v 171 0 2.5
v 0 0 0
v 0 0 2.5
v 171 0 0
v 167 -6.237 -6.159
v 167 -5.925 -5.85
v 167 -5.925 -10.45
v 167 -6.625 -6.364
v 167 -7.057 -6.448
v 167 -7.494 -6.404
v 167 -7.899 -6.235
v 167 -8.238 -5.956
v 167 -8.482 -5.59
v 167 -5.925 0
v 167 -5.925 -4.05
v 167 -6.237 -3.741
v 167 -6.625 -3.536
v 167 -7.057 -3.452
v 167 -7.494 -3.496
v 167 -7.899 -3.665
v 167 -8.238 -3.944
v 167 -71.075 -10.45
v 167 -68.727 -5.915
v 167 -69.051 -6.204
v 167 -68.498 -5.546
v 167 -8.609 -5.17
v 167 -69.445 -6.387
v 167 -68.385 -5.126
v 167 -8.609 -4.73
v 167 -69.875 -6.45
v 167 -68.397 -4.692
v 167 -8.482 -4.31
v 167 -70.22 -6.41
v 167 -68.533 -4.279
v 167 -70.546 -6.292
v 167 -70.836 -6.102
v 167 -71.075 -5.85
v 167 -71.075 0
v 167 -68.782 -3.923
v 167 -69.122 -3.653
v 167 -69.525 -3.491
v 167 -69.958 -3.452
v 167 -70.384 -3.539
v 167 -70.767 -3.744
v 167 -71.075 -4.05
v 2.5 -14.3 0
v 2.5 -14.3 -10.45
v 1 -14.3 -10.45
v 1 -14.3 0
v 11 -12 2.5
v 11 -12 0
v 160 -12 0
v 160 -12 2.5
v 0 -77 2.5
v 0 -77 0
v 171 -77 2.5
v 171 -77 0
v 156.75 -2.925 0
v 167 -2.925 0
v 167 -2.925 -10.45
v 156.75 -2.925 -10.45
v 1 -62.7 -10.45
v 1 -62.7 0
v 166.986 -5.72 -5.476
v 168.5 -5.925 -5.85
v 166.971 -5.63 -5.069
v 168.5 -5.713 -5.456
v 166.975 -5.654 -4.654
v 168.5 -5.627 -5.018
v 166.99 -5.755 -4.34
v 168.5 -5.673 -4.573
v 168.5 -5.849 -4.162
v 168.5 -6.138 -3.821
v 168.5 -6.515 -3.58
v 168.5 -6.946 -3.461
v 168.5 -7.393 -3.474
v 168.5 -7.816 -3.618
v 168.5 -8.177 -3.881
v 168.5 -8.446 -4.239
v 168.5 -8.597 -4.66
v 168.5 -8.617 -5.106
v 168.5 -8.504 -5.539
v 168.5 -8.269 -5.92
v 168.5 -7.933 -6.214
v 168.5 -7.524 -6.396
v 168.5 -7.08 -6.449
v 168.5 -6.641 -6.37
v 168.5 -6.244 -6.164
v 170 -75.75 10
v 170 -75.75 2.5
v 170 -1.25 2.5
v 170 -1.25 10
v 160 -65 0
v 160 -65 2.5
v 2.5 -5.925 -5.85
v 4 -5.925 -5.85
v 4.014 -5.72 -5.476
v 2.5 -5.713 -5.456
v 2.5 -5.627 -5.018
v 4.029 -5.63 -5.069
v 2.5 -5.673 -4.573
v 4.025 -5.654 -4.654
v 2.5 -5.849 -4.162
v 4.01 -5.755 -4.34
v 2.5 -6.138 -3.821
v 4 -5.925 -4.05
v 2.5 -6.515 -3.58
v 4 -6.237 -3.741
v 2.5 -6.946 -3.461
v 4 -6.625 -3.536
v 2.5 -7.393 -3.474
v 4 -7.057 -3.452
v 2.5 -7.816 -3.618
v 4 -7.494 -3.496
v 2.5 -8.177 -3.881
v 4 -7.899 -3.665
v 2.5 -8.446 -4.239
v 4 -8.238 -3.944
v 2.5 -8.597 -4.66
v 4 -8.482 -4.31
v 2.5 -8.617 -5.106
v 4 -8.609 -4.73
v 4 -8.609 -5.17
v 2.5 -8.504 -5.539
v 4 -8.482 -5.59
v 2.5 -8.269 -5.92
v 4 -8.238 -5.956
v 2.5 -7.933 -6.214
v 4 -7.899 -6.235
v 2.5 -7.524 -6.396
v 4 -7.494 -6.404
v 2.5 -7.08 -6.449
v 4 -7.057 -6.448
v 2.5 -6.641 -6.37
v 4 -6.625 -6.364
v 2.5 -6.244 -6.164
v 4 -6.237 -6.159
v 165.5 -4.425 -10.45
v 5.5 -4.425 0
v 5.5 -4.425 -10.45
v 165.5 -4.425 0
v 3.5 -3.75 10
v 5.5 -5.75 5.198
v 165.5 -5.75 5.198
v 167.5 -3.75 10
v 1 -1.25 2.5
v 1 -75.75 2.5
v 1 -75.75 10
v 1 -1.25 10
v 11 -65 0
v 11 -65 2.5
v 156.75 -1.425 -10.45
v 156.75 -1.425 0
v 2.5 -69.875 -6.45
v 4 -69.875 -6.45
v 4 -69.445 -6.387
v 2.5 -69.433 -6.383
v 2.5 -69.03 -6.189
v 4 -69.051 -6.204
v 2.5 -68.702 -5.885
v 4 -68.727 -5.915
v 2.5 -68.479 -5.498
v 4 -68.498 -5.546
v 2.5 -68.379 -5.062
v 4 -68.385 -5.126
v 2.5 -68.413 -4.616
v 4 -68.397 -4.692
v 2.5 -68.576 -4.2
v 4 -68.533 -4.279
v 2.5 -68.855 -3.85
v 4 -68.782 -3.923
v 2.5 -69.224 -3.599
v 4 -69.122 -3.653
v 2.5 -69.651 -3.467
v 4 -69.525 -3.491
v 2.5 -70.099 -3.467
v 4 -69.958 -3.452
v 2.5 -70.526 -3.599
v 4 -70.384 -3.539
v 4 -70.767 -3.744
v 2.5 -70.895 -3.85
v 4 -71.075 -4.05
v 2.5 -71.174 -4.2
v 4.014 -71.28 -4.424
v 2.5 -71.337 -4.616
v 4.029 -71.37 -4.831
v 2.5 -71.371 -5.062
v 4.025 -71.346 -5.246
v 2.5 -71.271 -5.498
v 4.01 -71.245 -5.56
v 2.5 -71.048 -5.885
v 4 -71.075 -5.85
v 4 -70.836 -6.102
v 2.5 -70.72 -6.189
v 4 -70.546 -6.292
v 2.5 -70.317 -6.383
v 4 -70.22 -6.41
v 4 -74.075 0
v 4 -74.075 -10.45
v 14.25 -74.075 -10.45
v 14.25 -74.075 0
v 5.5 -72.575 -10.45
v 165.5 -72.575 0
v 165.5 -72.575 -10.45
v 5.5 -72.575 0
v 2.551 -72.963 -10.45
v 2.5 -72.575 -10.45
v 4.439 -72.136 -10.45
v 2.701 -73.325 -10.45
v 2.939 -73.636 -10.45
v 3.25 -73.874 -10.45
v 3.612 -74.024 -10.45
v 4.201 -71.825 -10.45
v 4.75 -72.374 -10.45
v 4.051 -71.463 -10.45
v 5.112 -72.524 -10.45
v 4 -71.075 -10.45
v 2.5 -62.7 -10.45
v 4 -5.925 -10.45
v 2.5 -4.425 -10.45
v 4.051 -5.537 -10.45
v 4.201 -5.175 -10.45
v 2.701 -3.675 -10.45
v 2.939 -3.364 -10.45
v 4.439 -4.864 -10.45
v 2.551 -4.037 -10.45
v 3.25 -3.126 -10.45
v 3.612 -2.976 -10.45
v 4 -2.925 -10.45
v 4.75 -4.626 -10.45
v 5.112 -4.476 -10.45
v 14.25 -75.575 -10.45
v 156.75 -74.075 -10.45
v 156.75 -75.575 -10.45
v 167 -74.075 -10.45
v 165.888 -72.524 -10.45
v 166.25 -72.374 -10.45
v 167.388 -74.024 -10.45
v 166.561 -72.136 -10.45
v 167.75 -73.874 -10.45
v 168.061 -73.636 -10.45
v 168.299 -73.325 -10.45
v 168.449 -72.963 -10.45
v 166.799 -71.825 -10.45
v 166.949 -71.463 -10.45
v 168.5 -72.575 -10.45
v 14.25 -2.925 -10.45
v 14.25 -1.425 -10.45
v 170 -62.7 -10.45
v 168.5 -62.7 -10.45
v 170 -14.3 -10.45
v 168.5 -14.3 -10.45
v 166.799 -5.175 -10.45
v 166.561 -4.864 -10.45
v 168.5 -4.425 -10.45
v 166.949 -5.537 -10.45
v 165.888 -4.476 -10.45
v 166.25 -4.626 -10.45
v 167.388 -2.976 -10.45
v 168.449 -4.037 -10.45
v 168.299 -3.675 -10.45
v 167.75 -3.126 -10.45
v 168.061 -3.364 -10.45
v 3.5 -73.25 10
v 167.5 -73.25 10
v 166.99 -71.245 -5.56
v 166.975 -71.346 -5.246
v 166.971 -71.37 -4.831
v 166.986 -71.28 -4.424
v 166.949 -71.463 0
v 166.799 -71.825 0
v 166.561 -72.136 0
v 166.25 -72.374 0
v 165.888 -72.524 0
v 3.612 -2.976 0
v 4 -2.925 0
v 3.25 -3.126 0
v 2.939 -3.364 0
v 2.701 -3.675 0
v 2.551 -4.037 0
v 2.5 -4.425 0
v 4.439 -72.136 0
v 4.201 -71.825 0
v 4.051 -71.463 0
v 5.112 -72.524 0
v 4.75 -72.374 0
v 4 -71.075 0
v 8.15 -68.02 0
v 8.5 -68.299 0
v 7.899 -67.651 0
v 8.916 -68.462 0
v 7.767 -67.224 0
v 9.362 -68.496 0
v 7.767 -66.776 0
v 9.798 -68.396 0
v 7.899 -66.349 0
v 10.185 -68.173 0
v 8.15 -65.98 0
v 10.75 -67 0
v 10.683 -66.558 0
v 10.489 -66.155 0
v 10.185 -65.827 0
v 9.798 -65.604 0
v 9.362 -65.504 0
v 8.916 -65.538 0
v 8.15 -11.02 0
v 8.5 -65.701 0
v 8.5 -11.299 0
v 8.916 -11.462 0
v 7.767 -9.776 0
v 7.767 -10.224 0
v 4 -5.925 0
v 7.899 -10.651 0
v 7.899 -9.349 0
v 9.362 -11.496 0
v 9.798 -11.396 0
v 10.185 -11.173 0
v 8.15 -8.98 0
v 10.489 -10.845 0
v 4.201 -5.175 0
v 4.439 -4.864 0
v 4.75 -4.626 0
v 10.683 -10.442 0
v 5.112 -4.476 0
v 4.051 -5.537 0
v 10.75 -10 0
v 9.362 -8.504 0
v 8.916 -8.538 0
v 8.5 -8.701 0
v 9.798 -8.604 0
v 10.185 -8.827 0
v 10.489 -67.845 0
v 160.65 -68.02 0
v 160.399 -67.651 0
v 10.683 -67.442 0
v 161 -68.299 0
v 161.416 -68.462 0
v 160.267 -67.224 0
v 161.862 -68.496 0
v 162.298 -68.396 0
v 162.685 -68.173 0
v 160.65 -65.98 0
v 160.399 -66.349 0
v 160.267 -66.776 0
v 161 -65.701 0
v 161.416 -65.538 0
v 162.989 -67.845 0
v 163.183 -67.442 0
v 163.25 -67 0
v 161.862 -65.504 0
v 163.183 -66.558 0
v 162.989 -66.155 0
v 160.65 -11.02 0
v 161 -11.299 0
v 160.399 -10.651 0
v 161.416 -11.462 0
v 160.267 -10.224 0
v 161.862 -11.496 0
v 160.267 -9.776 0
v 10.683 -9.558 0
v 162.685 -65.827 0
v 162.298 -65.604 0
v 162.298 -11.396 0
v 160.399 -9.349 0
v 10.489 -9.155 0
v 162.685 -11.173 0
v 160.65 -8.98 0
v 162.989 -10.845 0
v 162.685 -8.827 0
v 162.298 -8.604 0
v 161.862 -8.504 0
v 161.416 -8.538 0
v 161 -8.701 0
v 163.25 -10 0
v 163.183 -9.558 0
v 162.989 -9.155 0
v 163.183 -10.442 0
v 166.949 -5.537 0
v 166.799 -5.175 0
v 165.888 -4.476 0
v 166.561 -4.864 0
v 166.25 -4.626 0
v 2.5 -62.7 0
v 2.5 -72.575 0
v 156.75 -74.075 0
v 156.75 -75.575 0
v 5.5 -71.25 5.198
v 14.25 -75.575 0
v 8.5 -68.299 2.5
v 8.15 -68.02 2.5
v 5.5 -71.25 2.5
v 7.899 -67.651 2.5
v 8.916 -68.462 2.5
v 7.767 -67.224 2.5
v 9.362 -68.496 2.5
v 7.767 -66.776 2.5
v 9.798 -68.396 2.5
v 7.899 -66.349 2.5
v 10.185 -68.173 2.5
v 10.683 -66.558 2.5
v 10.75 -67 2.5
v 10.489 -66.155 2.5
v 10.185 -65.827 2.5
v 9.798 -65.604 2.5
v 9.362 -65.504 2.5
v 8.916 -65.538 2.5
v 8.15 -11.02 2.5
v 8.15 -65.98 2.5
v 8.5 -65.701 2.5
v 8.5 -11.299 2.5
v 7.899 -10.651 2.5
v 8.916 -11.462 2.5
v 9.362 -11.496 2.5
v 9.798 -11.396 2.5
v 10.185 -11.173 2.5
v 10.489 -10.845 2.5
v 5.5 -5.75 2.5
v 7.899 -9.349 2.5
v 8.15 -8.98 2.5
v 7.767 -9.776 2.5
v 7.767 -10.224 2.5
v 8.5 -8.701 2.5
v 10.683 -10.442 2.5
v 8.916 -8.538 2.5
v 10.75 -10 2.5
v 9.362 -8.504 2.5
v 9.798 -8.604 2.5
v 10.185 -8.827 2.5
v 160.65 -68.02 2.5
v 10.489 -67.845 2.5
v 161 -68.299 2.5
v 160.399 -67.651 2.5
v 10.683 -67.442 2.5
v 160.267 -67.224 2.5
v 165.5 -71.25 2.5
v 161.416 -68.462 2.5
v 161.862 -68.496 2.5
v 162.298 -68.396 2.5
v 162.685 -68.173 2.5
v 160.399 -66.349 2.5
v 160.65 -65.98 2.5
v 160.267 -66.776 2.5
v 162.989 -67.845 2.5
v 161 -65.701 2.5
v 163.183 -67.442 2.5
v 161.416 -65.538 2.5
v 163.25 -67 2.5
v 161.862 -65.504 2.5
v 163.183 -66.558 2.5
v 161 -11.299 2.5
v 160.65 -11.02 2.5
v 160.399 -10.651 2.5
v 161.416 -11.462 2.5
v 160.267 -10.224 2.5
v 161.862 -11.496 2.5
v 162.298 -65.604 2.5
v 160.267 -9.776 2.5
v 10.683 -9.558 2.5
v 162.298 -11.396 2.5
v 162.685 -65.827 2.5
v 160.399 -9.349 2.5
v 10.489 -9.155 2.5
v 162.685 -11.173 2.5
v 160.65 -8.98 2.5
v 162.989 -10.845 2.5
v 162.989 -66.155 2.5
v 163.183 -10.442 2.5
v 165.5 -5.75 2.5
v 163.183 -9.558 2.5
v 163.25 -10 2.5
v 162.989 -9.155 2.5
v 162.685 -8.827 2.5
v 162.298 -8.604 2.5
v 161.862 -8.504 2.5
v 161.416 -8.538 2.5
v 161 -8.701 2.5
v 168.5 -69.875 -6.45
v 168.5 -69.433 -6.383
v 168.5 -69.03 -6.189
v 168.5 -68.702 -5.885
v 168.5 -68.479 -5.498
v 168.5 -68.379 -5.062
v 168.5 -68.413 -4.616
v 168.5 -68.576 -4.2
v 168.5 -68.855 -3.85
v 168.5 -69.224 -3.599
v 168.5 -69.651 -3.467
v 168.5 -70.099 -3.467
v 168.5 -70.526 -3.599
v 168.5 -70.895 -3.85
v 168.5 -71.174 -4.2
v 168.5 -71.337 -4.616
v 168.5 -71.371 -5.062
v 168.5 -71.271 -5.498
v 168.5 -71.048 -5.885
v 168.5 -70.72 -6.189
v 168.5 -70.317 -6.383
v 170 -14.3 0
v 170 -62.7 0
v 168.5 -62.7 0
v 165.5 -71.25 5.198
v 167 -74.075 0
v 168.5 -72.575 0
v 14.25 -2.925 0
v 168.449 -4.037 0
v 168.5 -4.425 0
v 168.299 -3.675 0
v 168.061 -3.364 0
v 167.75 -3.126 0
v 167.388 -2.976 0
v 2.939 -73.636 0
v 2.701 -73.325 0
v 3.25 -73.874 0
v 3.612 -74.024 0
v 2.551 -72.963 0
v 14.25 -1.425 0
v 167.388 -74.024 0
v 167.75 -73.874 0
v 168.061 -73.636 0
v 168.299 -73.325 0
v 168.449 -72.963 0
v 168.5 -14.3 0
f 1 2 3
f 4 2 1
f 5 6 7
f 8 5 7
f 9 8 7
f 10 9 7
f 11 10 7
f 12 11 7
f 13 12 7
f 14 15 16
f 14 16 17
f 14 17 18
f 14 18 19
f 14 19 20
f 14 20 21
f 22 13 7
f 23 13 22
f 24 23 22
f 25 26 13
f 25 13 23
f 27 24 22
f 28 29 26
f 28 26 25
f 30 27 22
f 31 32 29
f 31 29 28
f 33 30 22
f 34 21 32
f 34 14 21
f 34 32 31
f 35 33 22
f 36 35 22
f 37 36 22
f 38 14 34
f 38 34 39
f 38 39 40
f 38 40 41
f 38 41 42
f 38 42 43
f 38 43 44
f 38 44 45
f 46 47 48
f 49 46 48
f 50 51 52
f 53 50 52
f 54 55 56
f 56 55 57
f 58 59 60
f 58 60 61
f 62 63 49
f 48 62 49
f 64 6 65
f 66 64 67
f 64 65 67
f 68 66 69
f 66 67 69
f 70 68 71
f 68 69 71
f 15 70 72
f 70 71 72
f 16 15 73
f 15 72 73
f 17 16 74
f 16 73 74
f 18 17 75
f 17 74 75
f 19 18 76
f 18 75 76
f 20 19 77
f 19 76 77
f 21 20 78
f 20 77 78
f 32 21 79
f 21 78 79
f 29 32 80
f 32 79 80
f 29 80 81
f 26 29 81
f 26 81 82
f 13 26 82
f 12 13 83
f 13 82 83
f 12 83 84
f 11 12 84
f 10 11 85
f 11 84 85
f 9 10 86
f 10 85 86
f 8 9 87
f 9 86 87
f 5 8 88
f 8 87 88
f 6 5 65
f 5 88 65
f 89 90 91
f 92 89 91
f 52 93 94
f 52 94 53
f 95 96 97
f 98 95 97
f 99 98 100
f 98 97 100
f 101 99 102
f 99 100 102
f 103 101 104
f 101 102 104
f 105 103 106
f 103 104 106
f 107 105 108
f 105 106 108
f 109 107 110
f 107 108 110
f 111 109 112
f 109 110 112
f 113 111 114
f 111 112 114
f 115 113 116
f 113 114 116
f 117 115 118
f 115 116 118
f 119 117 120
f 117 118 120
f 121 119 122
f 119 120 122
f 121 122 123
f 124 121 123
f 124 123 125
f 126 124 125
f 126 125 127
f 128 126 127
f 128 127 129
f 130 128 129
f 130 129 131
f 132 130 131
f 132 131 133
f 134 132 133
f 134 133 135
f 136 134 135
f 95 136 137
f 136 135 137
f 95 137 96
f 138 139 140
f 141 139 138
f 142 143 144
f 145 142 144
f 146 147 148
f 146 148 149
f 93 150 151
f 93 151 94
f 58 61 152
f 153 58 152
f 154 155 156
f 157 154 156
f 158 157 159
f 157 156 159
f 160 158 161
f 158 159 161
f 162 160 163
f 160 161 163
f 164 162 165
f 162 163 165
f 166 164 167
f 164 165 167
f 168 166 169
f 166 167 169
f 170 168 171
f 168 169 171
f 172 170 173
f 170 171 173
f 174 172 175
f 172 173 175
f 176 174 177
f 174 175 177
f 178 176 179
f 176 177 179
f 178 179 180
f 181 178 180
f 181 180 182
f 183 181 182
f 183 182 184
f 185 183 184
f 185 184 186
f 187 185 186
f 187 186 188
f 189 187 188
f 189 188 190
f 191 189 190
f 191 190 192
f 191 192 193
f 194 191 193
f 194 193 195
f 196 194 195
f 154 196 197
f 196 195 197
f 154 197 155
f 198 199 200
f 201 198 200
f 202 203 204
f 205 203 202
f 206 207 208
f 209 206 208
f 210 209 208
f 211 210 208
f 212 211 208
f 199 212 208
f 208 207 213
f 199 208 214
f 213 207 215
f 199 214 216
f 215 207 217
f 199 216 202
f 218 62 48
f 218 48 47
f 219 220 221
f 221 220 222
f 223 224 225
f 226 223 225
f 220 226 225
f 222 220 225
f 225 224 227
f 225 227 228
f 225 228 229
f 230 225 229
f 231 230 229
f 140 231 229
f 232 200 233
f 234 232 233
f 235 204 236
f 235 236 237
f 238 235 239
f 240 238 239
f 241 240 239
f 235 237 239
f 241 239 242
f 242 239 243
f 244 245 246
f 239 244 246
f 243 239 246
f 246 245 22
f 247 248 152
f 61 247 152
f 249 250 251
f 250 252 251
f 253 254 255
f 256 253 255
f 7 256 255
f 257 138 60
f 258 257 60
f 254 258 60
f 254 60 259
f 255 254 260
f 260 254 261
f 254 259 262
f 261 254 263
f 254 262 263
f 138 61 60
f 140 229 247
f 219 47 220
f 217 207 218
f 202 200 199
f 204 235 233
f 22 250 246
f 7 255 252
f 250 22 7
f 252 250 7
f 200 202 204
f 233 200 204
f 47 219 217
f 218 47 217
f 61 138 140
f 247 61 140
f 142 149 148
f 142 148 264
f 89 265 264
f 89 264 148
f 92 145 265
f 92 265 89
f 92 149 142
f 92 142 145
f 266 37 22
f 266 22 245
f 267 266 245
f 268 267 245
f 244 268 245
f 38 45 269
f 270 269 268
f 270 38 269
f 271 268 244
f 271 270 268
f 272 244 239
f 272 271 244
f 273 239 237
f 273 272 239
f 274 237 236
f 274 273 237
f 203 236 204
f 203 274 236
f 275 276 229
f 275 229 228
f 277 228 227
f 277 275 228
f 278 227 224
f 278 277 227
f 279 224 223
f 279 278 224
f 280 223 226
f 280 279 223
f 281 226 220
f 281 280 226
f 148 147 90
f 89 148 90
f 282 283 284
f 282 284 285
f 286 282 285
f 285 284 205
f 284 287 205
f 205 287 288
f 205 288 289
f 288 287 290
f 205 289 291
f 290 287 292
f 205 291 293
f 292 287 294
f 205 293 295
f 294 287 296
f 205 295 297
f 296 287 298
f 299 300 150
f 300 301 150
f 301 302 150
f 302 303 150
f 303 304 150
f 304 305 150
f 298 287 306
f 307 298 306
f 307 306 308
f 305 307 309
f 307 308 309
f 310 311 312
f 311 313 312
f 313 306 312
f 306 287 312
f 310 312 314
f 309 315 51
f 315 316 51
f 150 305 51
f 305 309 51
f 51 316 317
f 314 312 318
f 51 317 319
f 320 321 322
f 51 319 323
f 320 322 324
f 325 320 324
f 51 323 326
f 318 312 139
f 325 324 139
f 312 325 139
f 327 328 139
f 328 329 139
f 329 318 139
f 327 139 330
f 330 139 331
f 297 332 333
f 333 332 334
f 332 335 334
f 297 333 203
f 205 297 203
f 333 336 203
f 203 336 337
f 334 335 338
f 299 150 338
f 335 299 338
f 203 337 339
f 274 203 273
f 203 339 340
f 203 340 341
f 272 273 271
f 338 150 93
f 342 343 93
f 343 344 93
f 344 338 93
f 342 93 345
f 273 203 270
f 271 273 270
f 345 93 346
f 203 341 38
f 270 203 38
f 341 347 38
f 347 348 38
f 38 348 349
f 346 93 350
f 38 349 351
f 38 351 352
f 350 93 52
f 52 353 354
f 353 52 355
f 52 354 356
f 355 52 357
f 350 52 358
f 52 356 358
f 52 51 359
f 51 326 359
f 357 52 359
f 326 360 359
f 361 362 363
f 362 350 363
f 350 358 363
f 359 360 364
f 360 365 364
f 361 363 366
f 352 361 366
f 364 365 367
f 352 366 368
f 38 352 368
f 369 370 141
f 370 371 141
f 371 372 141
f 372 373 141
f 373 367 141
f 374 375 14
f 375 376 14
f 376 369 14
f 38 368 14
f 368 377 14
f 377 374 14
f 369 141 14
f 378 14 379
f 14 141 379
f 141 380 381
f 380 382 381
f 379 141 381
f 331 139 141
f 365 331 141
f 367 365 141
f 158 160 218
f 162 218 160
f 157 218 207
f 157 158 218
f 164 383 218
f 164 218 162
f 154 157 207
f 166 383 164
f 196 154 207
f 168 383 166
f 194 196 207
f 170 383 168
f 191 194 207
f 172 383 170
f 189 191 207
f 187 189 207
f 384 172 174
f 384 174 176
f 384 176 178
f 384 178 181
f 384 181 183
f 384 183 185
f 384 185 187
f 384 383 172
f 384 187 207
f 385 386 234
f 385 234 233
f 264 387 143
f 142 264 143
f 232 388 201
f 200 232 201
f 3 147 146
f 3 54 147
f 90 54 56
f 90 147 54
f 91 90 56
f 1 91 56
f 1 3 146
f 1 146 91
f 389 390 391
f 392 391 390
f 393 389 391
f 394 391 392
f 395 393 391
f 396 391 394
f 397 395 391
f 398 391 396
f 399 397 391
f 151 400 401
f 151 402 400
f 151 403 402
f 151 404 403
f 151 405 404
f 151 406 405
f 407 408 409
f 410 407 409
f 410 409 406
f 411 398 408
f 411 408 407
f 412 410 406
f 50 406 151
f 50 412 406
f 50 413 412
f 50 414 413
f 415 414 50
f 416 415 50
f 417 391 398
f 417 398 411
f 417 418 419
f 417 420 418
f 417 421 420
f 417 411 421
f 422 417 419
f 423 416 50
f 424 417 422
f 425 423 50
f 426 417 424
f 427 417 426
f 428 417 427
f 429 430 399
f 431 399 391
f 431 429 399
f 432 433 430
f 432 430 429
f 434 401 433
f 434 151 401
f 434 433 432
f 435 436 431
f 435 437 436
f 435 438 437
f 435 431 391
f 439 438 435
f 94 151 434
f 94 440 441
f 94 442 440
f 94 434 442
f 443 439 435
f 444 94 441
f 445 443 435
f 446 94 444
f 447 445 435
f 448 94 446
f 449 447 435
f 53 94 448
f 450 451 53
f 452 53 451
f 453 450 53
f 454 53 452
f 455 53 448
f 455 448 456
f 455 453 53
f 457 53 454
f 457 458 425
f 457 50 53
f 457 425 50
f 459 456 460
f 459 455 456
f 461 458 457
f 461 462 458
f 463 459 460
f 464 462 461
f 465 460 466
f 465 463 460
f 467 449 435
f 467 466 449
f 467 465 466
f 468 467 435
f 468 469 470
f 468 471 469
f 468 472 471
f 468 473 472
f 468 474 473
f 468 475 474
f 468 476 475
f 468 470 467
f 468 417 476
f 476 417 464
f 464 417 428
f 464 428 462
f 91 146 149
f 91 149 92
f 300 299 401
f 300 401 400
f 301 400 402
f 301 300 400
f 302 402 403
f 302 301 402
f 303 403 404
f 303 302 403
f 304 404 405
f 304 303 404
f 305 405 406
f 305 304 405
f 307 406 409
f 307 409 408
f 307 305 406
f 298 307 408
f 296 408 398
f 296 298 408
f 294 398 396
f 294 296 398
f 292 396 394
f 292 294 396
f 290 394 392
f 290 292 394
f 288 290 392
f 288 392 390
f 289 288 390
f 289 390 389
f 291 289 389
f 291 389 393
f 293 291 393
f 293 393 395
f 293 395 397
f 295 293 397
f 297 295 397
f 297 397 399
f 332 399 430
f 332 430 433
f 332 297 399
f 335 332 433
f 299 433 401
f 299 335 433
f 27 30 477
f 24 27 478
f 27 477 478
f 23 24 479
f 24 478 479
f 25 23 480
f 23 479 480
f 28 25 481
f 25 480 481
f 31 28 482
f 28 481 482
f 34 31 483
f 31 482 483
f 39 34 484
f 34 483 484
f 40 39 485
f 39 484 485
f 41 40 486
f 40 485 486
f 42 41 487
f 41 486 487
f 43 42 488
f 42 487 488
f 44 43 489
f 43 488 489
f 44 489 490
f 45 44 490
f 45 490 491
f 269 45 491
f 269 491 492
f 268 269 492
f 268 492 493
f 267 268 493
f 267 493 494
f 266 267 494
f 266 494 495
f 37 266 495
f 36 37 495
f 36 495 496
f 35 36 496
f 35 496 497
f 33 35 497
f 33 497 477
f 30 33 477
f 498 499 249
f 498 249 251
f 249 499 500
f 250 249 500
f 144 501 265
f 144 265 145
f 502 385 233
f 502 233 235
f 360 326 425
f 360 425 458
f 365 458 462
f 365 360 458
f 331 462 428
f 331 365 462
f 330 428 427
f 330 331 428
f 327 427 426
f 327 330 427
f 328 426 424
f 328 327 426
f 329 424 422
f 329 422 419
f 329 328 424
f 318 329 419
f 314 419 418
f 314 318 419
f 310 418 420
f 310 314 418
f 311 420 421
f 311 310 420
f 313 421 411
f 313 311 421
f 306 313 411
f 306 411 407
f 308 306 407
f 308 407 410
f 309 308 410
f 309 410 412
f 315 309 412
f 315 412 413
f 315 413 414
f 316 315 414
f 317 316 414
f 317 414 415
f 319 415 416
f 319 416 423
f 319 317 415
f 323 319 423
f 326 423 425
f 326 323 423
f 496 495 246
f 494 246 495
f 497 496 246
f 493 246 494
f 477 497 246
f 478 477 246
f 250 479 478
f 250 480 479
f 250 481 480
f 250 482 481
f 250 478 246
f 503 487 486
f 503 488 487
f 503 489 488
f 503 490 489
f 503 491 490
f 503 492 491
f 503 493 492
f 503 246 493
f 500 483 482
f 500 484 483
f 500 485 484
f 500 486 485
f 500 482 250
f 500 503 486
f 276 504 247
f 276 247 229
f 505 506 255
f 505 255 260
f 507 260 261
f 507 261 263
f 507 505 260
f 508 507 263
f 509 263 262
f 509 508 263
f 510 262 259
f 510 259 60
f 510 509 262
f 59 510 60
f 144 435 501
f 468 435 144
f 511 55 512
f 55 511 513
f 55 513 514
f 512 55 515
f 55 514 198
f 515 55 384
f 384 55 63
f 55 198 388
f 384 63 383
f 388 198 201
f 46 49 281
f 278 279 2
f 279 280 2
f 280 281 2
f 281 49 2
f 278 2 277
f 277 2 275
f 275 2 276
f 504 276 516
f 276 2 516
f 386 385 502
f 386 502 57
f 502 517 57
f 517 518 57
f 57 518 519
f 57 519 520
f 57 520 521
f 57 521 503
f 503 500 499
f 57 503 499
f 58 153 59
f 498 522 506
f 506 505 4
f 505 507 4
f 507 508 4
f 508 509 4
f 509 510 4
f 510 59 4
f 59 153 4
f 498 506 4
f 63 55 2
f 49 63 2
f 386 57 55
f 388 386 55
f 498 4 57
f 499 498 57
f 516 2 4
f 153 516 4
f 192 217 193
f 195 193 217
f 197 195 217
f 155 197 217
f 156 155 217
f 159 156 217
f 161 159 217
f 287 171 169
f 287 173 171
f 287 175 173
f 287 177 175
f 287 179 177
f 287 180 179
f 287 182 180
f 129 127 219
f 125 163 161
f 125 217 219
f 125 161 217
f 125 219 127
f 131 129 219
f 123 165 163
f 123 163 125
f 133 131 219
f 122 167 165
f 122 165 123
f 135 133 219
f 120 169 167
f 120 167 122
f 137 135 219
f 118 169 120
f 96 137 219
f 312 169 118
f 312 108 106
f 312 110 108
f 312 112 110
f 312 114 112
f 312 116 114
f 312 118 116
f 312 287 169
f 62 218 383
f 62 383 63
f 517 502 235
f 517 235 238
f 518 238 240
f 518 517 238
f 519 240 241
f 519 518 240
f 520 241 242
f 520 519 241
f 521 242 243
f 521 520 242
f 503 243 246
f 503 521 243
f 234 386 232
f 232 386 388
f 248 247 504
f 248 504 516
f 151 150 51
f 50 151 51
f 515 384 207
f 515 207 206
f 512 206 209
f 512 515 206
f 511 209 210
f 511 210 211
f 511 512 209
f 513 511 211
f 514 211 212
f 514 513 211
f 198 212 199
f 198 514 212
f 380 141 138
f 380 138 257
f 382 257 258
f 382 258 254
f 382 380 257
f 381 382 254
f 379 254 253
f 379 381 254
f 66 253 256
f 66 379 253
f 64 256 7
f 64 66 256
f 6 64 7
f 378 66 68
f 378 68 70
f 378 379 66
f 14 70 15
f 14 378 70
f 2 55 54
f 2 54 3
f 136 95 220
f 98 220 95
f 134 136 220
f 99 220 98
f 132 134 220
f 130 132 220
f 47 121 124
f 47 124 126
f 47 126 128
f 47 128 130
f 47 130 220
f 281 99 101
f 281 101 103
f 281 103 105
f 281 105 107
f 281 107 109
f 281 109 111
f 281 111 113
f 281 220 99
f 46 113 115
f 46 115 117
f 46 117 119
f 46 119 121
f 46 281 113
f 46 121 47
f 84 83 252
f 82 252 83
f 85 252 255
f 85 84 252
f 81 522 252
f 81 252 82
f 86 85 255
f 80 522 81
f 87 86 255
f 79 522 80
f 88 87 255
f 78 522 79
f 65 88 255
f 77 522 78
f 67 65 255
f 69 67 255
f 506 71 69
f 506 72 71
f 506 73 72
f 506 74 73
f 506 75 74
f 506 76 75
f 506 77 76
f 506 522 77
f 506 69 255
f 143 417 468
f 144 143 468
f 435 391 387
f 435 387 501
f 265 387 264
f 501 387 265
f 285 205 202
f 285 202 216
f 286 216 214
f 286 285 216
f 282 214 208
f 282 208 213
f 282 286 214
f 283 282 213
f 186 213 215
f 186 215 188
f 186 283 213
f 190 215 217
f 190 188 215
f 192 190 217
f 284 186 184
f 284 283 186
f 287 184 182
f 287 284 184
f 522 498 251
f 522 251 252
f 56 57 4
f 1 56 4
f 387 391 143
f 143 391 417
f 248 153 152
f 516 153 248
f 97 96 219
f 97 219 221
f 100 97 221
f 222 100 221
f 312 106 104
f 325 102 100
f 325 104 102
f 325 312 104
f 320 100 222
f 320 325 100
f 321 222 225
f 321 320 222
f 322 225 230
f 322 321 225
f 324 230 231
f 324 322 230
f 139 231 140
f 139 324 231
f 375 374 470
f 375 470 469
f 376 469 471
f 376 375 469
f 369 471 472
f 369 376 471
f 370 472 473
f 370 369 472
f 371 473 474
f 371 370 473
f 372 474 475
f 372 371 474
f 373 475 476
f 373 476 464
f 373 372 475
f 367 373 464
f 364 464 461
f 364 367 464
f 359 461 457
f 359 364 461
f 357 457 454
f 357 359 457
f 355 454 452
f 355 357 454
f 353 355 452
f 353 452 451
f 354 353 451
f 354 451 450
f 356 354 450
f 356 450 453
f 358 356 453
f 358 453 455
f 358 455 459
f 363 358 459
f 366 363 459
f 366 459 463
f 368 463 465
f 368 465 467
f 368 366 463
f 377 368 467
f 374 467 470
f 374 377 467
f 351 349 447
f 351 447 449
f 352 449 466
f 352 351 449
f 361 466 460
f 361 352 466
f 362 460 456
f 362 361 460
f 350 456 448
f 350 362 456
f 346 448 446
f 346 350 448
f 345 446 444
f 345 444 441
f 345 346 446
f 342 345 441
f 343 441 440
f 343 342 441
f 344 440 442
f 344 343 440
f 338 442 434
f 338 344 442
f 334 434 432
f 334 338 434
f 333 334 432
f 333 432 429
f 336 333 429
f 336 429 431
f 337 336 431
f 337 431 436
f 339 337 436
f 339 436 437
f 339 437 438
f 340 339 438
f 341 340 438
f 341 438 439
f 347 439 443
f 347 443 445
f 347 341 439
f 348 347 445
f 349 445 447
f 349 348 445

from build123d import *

# Parameters (mm, degrees)
ESQUISSE1_W             = 171
ESQUISSE1_H             = 77
ESQUISSE1_R             = 1.5
ESQUISSE1_W_2           = 149
ESQUISSE1_H_2           = 53
BOSS_EXTRU_1_DEPTH      = 2.5
ESQUISSE2_W             = 169
ESQUISSE2_H             = 74.5
ESQUISSE2_W_2           = 160
ESQUISSE2_H_2           = 65.5
BOSS_EXTRU_2_DEPTH      = 7.5
CHANFREIN7_SIZE         = 2
CHANFREIN7_SIZE2        = 4.802328779
ESQUISSE4_W             = 142.5
ESQUISSE4_H             = 1.5
ESQUISSE4_W_2           = 1.5
ESQUISSE4_H_2           = 48.4
BOSS_EXTRU_3_DEPTH      = 10.45
ESQUISSE5_R             = 1.5
ENL_V_MAT_EXTRU_1_DEPTH = 186.554446188


with BuildPart() as part:
    # Esquisse1 → Boss.-Extru.1 (new body)
    with BuildSketch(Plane.XY):
        with Locations((85.5, -38.5)):
            Rectangle(ESQUISSE1_W, ESQUISSE1_H)
        with Locations((9.25, -10)):
            Circle(ESQUISSE1_R, mode=Mode.SUBTRACT)
        with Locations((161.75, -10)):
            Circle(ESQUISSE1_R, mode=Mode.SUBTRACT)
        with Locations((161.75, -67)):
            Circle(ESQUISSE1_R, mode=Mode.SUBTRACT)
        with Locations((9.25, -67)):
            Circle(ESQUISSE1_R, mode=Mode.SUBTRACT)
        with Locations((85.5, -38.5)):
            Rectangle(ESQUISSE1_W_2, ESQUISSE1_H_2, mode=Mode.SUBTRACT)
    extrude(amount=BOSS_EXTRU_1_DEPTH)

    # Esquisse2 → Boss.-Extru.2 (add)
    with BuildSketch(Plane.XY.offset(2.5)):
        with Locations((85.5, -38.5)):
            Rectangle(ESQUISSE2_W, ESQUISSE2_H)
        with Locations((85.5, -38.5)):
            Rectangle(ESQUISSE2_W_2, ESQUISSE2_H_2, mode=Mode.SUBTRACT)
    extrude(amount=BOSS_EXTRU_2_DEPTH)

    # Chanfrein7
    chanfrein7_edges = [part.edges().sort_by_distance(p)[0] for p in [
        (5.5, -38.5, 10),
        (85.5, -71.25, 10),
        (165.5, -38.5, 10),
        (85.5, -5.75, 10),
    ]]
    chanfrein7_side = [part.faces().sort_by_distance(p)[0] for p in [
        (85.5, -3.096923117, 10),
    ]]
    chamfer(chanfrein7_edges, length=CHANFREIN7_SIZE, length2=CHANFREIN7_SIZE2, reference=chanfrein7_side[0])

    # Esquisse4 → Boss.-Extru.3 (add)
    # profile 1 of 5: a face of its own
    with BuildSketch(Plane(origin=(0, 0, 0), x_dir=(-1, 0, 0), z_dir=(0, 0, -1))):
        with BuildLine():
            Line((-167, -2.925), (-4, -2.925))
            ThreePointArc((-4, -2.925), (-2.939339828, -3.364339828), (-2.5, -4.425))
            Line((-2.5, -4.425), (-2.5, -72.575))
            ThreePointArc((-2.5, -72.575), (-2.939339828, -73.635660172), (-4, -74.075))
            Line((-4, -74.075), (-167, -74.075))
            ThreePointArc((-167, -74.075), (-168.060660172, -73.635660172), (-168.5, -72.575))
            Line((-168.5, -72.575), (-168.5, -4.425))
            ThreePointArc((-168.5, -4.425), (-168.060660172, -3.364339828), (-167, -2.925))
        make_face()
        with BuildLine():
            Line((-167, -5.925), (-167, -71.075))
            ThreePointArc((-167, -71.075), (-166.560660172, -72.135660172), (-165.5, -72.575))
            Line((-165.5, -72.575), (-5.5, -72.575))
            ThreePointArc((-5.5, -72.575), (-4.439339828, -72.135660172), (-4, -71.075))
            Line((-4, -71.075), (-4, -5.925))
            ThreePointArc((-4, -5.925), (-4.439339828, -4.864339828), (-5.5, -4.425))
            Line((-5.5, -4.425), (-165.5, -4.425))
            ThreePointArc((-165.5, -4.425), (-166.560660172, -4.864339828), (-167, -5.925))
        make_face(mode=Mode.SUBTRACT)
    # profile 2 of 5: a face of its own
    with BuildSketch(Plane(origin=(0, 0, 0), x_dir=(-1, 0, 0), z_dir=(0, 0, -1))):
        with Locations((-85.5, -2.175)):
            Rectangle(ESQUISSE4_W, ESQUISSE4_H)
    # profile 3 of 5: a face of its own
    with BuildSketch(Plane(origin=(0, 0, 0), x_dir=(-1, 0, 0), z_dir=(0, 0, -1))):
        with Locations((-169.25, -38.5)):
            Rectangle(ESQUISSE4_W_2, ESQUISSE4_H_2)
    # profile 4 of 5: a face of its own
    with BuildSketch(Plane(origin=(0, 0, 0), x_dir=(-1, 0, 0), z_dir=(0, 0, -1))):
        with Locations((-85.5, -74.825)):
            Rectangle(ESQUISSE4_W, ESQUISSE4_H)
    # profile 5 of 5: a face of its own
    with BuildSketch(Plane(origin=(0, 0, 0), x_dir=(-1, 0, 0), z_dir=(0, 0, -1))):
        with Locations((-1.75, -38.5)):
            Rectangle(ESQUISSE4_W_2, ESQUISSE4_H_2)
    extrude(amount=BOSS_EXTRU_3_DEPTH)

    # Esquisse5 → Enlèv. mat.-Extru.1 (cut, through all)
    with BuildSketch(Plane(origin=(168.5, 0, 0), x_dir=(0, 0, -1), z_dir=(1, 0, 0))):
        with Locations(Location((4.95, -7.125, 0), (0, 0, 53.130102354))):
            Circle(ESQUISSE5_R)
        with Locations((4.95, -69.875)):
            Circle(ESQUISSE5_R)
    extrude(amount=-ENL_V_MAT_EXTRU_1_DEPTH, mode=Mode.SUBTRACT)


solid = part.part
